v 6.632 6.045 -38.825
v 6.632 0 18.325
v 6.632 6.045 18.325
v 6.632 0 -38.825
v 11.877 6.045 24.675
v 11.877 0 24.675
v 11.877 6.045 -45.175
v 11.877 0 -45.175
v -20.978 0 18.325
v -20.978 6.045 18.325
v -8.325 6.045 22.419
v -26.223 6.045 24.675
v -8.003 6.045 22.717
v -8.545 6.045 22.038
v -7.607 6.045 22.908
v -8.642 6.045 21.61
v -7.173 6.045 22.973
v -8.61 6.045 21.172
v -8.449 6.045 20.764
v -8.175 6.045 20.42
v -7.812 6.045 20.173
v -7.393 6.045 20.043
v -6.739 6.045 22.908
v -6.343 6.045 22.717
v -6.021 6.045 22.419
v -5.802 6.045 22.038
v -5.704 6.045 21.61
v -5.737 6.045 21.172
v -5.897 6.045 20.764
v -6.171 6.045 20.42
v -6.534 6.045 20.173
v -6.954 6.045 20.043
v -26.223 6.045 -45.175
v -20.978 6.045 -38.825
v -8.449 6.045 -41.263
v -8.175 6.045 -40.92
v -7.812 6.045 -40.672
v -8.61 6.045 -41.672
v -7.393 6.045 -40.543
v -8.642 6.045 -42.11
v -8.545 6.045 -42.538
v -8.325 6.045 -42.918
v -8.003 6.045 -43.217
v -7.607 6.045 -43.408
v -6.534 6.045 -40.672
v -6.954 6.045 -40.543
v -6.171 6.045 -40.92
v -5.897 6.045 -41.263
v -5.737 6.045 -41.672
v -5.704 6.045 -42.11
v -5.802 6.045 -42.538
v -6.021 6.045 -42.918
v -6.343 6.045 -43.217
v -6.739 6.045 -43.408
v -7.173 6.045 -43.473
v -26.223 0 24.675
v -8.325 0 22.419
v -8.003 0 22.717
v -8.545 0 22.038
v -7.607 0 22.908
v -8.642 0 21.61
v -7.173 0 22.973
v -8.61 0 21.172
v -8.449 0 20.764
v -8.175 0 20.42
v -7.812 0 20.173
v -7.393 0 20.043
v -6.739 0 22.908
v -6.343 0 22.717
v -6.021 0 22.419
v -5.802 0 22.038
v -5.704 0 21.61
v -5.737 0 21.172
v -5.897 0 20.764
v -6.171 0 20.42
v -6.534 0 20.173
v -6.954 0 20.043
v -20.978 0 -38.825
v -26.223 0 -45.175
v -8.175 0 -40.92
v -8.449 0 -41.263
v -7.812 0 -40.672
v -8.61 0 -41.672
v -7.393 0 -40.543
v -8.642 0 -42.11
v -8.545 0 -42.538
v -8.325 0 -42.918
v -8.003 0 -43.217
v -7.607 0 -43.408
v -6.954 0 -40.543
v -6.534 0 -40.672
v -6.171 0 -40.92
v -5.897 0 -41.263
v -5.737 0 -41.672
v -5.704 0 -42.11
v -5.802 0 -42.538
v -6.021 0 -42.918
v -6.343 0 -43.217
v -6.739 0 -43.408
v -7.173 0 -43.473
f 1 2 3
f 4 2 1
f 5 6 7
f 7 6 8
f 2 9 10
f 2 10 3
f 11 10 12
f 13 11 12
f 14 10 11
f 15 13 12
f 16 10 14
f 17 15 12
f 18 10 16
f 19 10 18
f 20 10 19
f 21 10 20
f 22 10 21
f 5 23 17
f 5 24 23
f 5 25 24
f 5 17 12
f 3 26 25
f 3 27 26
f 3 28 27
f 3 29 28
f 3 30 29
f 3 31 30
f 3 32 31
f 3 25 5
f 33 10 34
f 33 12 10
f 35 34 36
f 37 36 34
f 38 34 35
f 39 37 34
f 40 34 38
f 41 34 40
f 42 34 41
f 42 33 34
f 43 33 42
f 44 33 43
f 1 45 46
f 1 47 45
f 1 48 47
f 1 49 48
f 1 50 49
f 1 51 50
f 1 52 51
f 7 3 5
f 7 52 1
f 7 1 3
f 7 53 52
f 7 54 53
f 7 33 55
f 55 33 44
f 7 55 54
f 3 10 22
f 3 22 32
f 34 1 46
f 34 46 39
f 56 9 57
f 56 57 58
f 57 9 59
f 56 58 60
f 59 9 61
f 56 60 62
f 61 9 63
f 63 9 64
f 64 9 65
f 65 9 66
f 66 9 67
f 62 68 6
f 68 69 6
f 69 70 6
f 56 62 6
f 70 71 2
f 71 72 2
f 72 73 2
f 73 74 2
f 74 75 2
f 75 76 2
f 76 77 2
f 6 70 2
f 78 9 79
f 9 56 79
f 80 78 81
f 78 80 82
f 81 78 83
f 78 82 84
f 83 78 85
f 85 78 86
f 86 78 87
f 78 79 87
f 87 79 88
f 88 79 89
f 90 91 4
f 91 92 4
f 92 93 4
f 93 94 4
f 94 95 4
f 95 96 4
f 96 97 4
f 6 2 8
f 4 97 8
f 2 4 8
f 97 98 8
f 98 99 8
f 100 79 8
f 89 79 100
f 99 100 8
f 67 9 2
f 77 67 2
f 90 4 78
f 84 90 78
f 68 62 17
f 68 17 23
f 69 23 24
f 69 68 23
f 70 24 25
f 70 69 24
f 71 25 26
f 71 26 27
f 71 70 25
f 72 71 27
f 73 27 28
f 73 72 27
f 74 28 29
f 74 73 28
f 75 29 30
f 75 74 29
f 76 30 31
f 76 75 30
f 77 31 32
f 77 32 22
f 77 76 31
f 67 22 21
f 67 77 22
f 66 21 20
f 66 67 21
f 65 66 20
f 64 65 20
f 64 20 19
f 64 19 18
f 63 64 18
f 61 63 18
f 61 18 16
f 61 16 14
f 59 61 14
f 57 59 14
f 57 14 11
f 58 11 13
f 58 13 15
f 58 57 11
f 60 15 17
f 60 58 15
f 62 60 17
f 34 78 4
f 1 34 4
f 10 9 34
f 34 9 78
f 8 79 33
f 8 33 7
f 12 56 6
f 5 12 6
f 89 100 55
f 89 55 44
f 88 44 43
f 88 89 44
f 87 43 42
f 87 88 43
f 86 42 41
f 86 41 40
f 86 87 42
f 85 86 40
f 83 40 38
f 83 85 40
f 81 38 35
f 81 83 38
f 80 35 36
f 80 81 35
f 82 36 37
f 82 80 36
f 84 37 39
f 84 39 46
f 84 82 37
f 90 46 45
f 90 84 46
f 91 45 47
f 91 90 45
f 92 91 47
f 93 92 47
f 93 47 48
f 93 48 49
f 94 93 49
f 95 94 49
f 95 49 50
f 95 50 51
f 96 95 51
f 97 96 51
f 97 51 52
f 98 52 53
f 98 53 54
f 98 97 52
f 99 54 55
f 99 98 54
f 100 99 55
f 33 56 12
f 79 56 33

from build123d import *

# Parameters (mm, degrees)
SKETCH2_W           = 38.1
SKETCH2_H           = 69.85
SKETCH2_R           = 1.4732
SKETCH2_W_2         = 27.6098
SKETCH2_H_2         = 57.15
BOSS_EXTRUDE1_DEPTH = 6.0452


with BuildPart() as part:
    # Sketch2 → Boss-Extrude1 (new body)
    with BuildSketch(Plane(origin=(0, 0, 0), x_dir=(1, 0, 0), z_dir=(0, 1, 0))):
        with Locations((-7.173243467, 10.249774524)):
            Rectangle(SKETCH2_W, SKETCH2_H)
        with Locations(Location((-7.173243467, 41.999774524, 0), (0, 0, 90))):
            Circle(SKETCH2_R, mode=Mode.SUBTRACT)
        with Locations(Location((-7.173243467, -21.500225476, 0), (0, 0, 270))):
            Circle(SKETCH2_R, mode=Mode.SUBTRACT)
        with Locations((-7.173243467, 10.249774524)):
            Rectangle(SKETCH2_W_2, SKETCH2_H_2, mode=Mode.SUBTRACT)
    extrude(amount=BOSS_EXTRUDE1_DEPTH)


solid = part.part
